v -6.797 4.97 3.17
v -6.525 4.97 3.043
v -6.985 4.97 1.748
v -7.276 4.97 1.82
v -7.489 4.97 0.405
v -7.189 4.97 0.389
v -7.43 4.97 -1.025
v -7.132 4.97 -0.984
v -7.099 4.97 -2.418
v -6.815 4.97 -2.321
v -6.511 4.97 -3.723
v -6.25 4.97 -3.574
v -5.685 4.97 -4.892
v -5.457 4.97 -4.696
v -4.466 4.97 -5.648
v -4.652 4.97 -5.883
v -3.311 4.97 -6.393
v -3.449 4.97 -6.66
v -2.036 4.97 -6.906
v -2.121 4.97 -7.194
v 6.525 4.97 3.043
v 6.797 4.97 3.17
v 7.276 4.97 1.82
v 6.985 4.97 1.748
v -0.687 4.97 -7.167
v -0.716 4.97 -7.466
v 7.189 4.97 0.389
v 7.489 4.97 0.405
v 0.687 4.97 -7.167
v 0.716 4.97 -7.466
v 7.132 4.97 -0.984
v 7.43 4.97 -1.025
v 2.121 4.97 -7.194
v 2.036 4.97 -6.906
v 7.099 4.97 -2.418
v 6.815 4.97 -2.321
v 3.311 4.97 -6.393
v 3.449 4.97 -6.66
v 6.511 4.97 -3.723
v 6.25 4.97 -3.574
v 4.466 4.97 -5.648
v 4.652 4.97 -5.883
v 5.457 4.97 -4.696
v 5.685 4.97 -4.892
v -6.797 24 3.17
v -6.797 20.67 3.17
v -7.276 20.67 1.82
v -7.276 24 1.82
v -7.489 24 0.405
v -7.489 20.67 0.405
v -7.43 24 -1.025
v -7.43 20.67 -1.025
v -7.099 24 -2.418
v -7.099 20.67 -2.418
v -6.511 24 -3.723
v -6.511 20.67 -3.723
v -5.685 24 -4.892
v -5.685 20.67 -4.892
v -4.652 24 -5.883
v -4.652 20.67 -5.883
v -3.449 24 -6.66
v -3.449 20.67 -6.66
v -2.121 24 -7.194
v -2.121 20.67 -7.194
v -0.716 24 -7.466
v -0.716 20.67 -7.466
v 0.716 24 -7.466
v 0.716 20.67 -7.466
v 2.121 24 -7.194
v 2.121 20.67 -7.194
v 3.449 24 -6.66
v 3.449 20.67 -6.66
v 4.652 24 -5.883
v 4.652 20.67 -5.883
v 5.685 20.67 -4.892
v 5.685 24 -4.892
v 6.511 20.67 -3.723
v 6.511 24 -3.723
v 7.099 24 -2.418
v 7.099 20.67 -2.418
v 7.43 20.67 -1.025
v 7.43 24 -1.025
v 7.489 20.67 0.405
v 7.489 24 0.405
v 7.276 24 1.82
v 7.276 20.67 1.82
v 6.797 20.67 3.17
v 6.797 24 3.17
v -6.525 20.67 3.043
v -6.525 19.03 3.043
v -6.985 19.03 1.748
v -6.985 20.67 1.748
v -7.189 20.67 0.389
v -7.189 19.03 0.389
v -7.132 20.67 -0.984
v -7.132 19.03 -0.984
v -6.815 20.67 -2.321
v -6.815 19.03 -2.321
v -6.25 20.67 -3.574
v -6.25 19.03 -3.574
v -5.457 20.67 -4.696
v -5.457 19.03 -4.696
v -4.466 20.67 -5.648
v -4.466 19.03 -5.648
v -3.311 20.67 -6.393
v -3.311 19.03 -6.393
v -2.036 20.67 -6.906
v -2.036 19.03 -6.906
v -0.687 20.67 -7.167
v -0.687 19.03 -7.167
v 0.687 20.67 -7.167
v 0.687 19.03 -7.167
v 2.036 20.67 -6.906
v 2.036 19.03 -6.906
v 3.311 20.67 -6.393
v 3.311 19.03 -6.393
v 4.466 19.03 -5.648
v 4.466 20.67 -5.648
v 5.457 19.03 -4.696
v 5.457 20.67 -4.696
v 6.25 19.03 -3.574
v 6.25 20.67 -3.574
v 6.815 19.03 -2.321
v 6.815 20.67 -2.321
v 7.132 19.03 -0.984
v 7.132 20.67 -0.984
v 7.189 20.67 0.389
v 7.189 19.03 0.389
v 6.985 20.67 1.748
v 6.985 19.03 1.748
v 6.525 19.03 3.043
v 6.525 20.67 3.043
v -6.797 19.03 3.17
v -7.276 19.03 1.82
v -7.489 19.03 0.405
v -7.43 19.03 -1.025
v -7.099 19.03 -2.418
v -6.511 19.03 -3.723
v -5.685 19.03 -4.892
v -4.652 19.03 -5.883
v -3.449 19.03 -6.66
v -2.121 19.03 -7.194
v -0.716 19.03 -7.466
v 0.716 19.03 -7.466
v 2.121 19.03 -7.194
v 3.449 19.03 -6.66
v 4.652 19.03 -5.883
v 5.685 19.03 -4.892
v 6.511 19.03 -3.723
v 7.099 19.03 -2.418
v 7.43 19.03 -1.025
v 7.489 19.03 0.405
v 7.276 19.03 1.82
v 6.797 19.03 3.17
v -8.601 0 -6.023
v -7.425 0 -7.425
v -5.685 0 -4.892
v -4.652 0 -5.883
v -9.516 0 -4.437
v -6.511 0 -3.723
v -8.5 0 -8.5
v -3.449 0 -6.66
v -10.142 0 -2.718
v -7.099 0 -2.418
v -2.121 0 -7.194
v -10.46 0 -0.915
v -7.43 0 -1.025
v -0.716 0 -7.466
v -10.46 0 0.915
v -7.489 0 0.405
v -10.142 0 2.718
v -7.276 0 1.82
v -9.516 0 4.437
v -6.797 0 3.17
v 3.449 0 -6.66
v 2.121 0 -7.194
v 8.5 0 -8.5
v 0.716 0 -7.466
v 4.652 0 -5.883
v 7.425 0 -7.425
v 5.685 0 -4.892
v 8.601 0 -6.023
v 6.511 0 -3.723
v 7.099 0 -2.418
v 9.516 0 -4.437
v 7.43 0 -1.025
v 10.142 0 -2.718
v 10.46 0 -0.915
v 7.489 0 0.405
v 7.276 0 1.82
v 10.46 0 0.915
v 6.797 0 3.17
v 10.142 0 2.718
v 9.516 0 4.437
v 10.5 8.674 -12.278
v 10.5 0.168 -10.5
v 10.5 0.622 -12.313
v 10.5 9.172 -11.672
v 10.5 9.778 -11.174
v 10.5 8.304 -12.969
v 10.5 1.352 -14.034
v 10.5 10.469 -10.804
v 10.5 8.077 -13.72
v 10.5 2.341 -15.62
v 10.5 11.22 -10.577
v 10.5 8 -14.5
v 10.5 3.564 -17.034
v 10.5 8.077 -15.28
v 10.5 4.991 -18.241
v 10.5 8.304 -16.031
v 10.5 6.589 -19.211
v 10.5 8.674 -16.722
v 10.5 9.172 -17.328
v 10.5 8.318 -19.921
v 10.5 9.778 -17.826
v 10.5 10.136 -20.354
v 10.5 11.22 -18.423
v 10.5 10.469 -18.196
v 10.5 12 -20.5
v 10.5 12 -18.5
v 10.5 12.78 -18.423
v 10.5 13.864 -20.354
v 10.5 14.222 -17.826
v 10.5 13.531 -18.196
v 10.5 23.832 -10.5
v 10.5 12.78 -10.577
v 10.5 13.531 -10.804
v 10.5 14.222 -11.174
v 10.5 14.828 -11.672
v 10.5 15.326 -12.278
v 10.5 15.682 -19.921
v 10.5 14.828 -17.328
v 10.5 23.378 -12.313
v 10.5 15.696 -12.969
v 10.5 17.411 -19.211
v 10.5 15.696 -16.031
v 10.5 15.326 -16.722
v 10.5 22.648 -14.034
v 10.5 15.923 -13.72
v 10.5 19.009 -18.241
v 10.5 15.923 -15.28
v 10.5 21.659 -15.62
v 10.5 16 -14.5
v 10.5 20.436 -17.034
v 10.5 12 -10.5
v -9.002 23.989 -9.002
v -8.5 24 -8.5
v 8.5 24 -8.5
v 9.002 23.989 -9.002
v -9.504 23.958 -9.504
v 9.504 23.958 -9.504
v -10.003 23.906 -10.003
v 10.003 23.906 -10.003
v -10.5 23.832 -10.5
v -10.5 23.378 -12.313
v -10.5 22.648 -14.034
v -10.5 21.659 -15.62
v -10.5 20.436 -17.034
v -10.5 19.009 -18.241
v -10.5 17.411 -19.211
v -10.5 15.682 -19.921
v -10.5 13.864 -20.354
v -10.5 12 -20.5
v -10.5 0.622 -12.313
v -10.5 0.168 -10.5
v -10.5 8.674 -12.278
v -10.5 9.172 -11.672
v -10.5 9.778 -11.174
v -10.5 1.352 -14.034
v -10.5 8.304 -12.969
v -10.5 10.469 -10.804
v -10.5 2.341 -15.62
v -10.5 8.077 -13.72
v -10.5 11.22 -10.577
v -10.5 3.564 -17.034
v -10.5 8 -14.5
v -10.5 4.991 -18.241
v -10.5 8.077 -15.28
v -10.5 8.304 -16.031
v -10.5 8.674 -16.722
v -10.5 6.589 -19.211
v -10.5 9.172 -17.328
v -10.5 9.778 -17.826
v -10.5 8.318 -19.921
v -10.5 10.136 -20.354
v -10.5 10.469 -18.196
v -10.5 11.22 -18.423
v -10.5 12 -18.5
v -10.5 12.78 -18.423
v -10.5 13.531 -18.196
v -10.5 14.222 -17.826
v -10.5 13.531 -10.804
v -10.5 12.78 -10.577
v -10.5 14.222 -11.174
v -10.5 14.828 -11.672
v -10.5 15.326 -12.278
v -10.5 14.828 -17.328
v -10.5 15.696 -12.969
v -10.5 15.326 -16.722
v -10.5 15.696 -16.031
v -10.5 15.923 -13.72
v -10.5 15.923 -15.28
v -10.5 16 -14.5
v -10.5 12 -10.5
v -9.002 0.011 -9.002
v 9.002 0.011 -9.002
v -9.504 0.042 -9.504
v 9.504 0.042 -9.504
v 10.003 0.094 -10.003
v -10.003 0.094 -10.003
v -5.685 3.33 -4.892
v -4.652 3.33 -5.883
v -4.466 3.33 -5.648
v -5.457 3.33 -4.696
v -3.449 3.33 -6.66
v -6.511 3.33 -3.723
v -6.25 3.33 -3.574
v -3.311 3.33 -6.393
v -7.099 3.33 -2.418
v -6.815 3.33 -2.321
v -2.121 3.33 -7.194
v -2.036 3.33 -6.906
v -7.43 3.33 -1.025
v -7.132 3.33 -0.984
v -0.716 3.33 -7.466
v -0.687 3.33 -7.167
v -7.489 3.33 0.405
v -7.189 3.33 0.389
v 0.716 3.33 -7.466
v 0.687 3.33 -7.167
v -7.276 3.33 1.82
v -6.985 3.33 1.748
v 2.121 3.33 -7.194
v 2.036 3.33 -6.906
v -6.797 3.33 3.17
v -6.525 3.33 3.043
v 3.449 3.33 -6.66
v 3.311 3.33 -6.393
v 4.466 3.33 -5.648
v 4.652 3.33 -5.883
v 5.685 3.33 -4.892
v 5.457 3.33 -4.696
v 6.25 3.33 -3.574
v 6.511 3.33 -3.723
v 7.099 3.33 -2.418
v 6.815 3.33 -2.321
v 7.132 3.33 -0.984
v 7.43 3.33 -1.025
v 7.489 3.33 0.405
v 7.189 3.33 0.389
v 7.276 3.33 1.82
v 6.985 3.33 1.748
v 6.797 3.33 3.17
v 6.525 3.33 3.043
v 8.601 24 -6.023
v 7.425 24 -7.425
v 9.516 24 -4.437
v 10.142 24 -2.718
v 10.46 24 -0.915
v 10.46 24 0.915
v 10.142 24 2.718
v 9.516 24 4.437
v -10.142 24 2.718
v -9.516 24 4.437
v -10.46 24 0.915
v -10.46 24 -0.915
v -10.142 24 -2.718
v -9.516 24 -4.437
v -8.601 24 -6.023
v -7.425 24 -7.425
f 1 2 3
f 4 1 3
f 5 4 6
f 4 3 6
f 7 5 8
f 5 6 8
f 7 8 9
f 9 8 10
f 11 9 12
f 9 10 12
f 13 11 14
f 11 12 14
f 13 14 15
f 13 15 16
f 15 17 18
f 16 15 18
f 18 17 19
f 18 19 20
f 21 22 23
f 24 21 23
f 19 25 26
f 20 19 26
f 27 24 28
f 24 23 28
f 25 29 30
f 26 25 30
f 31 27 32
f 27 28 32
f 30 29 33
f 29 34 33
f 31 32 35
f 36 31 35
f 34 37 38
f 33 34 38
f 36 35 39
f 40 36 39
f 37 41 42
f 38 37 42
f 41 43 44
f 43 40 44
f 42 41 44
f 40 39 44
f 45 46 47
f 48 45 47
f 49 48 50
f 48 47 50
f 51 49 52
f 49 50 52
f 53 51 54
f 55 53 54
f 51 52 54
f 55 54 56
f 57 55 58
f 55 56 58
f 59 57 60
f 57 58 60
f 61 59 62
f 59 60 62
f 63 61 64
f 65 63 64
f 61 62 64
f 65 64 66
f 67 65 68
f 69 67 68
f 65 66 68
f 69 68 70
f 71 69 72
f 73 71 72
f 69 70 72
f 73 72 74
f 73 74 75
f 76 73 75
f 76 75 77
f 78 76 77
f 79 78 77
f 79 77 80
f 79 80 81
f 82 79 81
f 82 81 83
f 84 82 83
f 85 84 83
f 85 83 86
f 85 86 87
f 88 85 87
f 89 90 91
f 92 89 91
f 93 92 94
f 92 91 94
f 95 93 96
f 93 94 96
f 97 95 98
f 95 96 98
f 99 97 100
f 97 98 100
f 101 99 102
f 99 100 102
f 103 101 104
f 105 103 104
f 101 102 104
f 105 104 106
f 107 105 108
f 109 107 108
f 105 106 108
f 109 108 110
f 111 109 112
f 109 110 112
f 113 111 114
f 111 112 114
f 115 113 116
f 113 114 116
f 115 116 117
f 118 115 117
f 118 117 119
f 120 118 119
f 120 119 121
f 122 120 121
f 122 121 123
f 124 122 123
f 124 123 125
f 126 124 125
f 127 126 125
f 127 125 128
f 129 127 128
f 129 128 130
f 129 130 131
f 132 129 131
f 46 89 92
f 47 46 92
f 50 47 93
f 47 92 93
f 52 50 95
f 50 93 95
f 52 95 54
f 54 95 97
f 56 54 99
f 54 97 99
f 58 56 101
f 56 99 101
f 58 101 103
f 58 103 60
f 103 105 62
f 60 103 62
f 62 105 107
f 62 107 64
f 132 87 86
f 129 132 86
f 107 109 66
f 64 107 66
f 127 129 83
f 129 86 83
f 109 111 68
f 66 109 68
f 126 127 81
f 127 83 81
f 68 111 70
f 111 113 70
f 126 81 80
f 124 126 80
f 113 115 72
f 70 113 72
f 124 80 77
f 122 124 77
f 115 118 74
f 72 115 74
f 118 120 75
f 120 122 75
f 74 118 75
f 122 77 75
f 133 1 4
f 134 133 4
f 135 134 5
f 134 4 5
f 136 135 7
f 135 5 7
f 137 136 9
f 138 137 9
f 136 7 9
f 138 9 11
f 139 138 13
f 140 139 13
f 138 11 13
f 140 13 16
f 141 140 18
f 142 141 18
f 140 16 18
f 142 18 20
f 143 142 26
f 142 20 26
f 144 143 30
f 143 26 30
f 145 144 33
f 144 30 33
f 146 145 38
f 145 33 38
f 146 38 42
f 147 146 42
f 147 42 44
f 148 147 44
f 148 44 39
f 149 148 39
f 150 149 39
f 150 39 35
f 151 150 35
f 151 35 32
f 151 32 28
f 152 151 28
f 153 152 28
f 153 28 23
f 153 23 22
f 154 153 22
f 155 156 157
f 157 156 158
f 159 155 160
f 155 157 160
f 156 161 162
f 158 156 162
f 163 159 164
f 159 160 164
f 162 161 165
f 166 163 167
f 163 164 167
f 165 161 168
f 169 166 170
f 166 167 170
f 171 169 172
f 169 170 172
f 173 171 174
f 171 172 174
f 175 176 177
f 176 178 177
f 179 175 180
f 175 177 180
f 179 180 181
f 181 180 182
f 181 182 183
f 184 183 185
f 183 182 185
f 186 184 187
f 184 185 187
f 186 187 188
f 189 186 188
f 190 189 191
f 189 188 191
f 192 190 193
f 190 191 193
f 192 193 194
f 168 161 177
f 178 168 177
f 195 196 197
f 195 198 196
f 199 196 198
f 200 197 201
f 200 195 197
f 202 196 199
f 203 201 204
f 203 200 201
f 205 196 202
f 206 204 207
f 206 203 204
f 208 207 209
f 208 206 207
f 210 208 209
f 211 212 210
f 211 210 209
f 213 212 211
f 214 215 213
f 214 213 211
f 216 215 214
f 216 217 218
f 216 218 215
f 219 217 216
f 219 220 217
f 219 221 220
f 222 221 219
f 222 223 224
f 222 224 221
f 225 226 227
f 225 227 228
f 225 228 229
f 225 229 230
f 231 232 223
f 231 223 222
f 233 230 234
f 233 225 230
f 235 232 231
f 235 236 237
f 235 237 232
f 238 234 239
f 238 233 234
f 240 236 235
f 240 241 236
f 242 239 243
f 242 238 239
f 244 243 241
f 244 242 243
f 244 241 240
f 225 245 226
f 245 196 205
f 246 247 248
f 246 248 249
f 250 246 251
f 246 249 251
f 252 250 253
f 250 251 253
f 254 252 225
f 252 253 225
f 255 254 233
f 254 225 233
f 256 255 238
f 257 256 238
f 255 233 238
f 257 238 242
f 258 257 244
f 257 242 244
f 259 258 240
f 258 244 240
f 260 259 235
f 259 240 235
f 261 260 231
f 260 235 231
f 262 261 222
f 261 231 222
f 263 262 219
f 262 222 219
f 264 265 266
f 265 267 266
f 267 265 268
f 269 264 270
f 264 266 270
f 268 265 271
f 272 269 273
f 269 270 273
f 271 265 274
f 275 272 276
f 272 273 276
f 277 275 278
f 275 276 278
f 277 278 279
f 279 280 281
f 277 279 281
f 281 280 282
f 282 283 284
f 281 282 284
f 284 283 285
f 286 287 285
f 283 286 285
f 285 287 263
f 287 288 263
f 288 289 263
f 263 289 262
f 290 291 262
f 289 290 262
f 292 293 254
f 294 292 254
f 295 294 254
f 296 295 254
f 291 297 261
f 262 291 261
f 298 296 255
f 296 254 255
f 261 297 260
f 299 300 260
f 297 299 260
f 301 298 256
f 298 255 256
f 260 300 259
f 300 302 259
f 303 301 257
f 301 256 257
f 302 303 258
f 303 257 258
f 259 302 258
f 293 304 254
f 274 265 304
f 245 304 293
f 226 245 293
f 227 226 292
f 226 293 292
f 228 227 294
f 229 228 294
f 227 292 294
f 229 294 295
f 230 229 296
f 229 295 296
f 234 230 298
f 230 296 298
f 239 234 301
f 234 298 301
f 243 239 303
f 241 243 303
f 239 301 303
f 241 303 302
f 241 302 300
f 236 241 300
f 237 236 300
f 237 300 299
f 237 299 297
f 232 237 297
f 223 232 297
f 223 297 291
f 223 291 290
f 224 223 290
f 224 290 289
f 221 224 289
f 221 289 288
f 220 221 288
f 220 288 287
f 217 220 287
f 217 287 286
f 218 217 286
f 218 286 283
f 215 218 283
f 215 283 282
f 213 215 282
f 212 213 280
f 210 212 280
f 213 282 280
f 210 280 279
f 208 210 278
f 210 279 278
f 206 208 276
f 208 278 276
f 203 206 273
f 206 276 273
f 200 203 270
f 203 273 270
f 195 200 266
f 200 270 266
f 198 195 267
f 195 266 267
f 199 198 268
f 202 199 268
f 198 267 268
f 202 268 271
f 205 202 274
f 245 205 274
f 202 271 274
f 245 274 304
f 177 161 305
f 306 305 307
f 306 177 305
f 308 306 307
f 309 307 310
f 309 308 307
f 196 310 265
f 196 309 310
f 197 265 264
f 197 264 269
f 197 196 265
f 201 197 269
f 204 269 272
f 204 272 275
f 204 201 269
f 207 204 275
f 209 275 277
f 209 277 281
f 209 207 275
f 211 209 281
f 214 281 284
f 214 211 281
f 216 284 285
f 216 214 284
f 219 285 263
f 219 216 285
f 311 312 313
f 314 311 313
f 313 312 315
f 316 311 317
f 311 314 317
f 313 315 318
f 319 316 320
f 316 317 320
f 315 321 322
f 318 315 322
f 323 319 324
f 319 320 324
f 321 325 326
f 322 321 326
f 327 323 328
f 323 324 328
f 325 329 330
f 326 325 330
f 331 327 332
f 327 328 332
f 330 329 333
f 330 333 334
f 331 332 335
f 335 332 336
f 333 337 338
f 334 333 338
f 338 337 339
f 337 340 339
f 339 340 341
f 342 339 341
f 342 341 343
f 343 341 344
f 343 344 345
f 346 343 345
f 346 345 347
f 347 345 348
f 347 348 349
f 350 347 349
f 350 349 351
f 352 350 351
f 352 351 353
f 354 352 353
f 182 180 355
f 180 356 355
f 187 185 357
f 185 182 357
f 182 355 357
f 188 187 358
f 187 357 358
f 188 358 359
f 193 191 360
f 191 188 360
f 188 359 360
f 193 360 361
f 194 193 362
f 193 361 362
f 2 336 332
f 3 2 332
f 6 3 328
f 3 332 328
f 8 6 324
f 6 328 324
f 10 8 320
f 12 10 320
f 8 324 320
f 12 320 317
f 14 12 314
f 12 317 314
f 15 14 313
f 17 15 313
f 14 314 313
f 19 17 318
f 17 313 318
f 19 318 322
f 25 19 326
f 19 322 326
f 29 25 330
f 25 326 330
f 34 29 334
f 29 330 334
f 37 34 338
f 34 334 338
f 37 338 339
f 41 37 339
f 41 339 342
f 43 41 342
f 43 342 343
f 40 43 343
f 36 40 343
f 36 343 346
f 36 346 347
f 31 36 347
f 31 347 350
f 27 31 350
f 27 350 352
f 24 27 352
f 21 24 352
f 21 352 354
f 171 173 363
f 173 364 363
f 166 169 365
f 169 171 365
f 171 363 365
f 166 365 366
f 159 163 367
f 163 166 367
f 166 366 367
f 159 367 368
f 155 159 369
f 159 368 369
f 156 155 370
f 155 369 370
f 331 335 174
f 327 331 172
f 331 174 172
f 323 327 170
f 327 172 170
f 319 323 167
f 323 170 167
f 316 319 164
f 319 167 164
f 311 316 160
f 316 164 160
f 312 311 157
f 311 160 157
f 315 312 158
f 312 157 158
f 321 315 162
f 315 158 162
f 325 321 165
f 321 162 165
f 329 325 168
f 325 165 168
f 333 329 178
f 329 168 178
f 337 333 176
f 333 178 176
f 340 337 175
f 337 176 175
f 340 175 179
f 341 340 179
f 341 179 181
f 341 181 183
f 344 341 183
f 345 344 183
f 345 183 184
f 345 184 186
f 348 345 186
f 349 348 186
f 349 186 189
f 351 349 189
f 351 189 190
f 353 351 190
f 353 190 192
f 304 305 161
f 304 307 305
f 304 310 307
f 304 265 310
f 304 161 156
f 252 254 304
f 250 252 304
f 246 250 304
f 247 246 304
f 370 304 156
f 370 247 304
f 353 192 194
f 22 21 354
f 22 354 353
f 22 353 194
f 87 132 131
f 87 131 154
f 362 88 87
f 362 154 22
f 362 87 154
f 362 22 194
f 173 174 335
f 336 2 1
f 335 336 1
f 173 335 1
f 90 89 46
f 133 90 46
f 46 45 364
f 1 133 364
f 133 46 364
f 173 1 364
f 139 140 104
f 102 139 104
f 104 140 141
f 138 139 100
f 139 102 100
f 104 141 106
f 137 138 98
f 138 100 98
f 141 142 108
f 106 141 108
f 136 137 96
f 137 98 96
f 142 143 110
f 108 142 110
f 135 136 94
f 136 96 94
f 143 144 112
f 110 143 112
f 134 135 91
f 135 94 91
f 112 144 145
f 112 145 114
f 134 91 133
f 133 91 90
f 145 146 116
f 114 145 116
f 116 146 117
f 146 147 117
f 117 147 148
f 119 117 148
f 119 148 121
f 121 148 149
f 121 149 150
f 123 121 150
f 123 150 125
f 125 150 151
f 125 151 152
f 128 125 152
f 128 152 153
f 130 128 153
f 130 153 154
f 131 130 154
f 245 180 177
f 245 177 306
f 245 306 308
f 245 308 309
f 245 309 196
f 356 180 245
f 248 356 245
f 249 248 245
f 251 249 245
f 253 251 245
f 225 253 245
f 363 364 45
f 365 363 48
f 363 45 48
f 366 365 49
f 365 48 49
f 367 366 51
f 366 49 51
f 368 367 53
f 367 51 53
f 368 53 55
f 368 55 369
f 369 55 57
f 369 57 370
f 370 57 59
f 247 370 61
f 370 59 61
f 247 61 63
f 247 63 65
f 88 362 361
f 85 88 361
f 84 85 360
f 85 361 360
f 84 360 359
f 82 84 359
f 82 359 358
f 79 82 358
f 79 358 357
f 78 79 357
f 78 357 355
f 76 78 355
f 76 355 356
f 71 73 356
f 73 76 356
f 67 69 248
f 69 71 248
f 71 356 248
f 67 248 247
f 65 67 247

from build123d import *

# Parameters (mm, degrees)
REVOLVE1_ANGLE      = 230
SKETCH2_W           = 21
SKETCH2_H           = 10
BOSS_EXTRUDE1_DEPTH = 24
FILLET1_R           = 12
SKETCH3_R           = 4
CUT_EXTRUDE1_DEPTH  = 38.911080175


with BuildPart() as part:
    # Sketch1 → Revolve1 (revolve, symmetric)
    with BuildSketch(Plane(origin=(0, 0, 0), x_dir=(0, 0, -1), z_dir=(1, 0, 0))) as revolve1_sk:
        Polygon((10.5, 24), (7.5, 24), (7.5, 20.67), (7.2, 20.67), (7.2, 19.03), (7.5, 19.03), (7.5, 4.97), (7.2, 4.97), (7.2, 3.33), (7.5, 3.33), (7.5, 0), (10.5, 0), align=None)
    revolve(axis=Axis((0, -542.901644974, 0), (0, 1, 0)), revolution_arc=REVOLVE1_ANGLE / 2)
    revolve(revolve1_sk.sketch, axis=Axis((0, -542.901644974, 0), (0, -1, 0)), revolution_arc=REVOLVE1_ANGLE / 2)

    # Sketch2 → Boss-Extrude1 (add)
    with BuildSketch(Plane(origin=(0, 24, 0), x_dir=(1, 0, 0), z_dir=(0, 1, 0))):
        with Locations((0, 15.5)):
            Rectangle(SKETCH2_W, SKETCH2_H)
        with BuildLine():
            Line((10.5, 10.5), (1.4e-08, 10.5))
            ThreePointArc((1.4e-08, 10.5), (4.018176046, 9.700735089), (7.424621202, 7.424621202))
            Line((7.424621202, 7.424621202), (10.5, 10.5))
        make_face()
        with BuildLine():
            Line((1.4e-08, 10.5), (-10.5, 10.5))
            Line((-10.5, 10.5), (-7.424621202, 7.424621202))
            ThreePointArc((-7.424621202, 7.424621202), (-4.018176034, 9.700735094), (1.4e-08, 10.5))
        make_face()
    extrude(amount=-BOSS_EXTRUDE1_DEPTH)

    # Fillet1
    fillet1_edges = [part.edges().sort_by_distance(p)[0] for p in [
        (0, 0, -20.5),
        (0, 24, -20.5),
    ]]
    fillet(fillet1_edges, radius=FILLET1_R - 0.0001)  # a hair under: the kernel refuses the full size

    # Sketch3 → Cut-Extrude1 (cut, through all)
    with BuildSketch(Plane.ZY.offset(10.5)):
        with Locations((-14.5, 12)):
            Circle(SKETCH3_R)
    extrude(amount=-CUT_EXTRUDE1_DEPTH, mode=Mode.SUBTRACT)


solid = part.part
